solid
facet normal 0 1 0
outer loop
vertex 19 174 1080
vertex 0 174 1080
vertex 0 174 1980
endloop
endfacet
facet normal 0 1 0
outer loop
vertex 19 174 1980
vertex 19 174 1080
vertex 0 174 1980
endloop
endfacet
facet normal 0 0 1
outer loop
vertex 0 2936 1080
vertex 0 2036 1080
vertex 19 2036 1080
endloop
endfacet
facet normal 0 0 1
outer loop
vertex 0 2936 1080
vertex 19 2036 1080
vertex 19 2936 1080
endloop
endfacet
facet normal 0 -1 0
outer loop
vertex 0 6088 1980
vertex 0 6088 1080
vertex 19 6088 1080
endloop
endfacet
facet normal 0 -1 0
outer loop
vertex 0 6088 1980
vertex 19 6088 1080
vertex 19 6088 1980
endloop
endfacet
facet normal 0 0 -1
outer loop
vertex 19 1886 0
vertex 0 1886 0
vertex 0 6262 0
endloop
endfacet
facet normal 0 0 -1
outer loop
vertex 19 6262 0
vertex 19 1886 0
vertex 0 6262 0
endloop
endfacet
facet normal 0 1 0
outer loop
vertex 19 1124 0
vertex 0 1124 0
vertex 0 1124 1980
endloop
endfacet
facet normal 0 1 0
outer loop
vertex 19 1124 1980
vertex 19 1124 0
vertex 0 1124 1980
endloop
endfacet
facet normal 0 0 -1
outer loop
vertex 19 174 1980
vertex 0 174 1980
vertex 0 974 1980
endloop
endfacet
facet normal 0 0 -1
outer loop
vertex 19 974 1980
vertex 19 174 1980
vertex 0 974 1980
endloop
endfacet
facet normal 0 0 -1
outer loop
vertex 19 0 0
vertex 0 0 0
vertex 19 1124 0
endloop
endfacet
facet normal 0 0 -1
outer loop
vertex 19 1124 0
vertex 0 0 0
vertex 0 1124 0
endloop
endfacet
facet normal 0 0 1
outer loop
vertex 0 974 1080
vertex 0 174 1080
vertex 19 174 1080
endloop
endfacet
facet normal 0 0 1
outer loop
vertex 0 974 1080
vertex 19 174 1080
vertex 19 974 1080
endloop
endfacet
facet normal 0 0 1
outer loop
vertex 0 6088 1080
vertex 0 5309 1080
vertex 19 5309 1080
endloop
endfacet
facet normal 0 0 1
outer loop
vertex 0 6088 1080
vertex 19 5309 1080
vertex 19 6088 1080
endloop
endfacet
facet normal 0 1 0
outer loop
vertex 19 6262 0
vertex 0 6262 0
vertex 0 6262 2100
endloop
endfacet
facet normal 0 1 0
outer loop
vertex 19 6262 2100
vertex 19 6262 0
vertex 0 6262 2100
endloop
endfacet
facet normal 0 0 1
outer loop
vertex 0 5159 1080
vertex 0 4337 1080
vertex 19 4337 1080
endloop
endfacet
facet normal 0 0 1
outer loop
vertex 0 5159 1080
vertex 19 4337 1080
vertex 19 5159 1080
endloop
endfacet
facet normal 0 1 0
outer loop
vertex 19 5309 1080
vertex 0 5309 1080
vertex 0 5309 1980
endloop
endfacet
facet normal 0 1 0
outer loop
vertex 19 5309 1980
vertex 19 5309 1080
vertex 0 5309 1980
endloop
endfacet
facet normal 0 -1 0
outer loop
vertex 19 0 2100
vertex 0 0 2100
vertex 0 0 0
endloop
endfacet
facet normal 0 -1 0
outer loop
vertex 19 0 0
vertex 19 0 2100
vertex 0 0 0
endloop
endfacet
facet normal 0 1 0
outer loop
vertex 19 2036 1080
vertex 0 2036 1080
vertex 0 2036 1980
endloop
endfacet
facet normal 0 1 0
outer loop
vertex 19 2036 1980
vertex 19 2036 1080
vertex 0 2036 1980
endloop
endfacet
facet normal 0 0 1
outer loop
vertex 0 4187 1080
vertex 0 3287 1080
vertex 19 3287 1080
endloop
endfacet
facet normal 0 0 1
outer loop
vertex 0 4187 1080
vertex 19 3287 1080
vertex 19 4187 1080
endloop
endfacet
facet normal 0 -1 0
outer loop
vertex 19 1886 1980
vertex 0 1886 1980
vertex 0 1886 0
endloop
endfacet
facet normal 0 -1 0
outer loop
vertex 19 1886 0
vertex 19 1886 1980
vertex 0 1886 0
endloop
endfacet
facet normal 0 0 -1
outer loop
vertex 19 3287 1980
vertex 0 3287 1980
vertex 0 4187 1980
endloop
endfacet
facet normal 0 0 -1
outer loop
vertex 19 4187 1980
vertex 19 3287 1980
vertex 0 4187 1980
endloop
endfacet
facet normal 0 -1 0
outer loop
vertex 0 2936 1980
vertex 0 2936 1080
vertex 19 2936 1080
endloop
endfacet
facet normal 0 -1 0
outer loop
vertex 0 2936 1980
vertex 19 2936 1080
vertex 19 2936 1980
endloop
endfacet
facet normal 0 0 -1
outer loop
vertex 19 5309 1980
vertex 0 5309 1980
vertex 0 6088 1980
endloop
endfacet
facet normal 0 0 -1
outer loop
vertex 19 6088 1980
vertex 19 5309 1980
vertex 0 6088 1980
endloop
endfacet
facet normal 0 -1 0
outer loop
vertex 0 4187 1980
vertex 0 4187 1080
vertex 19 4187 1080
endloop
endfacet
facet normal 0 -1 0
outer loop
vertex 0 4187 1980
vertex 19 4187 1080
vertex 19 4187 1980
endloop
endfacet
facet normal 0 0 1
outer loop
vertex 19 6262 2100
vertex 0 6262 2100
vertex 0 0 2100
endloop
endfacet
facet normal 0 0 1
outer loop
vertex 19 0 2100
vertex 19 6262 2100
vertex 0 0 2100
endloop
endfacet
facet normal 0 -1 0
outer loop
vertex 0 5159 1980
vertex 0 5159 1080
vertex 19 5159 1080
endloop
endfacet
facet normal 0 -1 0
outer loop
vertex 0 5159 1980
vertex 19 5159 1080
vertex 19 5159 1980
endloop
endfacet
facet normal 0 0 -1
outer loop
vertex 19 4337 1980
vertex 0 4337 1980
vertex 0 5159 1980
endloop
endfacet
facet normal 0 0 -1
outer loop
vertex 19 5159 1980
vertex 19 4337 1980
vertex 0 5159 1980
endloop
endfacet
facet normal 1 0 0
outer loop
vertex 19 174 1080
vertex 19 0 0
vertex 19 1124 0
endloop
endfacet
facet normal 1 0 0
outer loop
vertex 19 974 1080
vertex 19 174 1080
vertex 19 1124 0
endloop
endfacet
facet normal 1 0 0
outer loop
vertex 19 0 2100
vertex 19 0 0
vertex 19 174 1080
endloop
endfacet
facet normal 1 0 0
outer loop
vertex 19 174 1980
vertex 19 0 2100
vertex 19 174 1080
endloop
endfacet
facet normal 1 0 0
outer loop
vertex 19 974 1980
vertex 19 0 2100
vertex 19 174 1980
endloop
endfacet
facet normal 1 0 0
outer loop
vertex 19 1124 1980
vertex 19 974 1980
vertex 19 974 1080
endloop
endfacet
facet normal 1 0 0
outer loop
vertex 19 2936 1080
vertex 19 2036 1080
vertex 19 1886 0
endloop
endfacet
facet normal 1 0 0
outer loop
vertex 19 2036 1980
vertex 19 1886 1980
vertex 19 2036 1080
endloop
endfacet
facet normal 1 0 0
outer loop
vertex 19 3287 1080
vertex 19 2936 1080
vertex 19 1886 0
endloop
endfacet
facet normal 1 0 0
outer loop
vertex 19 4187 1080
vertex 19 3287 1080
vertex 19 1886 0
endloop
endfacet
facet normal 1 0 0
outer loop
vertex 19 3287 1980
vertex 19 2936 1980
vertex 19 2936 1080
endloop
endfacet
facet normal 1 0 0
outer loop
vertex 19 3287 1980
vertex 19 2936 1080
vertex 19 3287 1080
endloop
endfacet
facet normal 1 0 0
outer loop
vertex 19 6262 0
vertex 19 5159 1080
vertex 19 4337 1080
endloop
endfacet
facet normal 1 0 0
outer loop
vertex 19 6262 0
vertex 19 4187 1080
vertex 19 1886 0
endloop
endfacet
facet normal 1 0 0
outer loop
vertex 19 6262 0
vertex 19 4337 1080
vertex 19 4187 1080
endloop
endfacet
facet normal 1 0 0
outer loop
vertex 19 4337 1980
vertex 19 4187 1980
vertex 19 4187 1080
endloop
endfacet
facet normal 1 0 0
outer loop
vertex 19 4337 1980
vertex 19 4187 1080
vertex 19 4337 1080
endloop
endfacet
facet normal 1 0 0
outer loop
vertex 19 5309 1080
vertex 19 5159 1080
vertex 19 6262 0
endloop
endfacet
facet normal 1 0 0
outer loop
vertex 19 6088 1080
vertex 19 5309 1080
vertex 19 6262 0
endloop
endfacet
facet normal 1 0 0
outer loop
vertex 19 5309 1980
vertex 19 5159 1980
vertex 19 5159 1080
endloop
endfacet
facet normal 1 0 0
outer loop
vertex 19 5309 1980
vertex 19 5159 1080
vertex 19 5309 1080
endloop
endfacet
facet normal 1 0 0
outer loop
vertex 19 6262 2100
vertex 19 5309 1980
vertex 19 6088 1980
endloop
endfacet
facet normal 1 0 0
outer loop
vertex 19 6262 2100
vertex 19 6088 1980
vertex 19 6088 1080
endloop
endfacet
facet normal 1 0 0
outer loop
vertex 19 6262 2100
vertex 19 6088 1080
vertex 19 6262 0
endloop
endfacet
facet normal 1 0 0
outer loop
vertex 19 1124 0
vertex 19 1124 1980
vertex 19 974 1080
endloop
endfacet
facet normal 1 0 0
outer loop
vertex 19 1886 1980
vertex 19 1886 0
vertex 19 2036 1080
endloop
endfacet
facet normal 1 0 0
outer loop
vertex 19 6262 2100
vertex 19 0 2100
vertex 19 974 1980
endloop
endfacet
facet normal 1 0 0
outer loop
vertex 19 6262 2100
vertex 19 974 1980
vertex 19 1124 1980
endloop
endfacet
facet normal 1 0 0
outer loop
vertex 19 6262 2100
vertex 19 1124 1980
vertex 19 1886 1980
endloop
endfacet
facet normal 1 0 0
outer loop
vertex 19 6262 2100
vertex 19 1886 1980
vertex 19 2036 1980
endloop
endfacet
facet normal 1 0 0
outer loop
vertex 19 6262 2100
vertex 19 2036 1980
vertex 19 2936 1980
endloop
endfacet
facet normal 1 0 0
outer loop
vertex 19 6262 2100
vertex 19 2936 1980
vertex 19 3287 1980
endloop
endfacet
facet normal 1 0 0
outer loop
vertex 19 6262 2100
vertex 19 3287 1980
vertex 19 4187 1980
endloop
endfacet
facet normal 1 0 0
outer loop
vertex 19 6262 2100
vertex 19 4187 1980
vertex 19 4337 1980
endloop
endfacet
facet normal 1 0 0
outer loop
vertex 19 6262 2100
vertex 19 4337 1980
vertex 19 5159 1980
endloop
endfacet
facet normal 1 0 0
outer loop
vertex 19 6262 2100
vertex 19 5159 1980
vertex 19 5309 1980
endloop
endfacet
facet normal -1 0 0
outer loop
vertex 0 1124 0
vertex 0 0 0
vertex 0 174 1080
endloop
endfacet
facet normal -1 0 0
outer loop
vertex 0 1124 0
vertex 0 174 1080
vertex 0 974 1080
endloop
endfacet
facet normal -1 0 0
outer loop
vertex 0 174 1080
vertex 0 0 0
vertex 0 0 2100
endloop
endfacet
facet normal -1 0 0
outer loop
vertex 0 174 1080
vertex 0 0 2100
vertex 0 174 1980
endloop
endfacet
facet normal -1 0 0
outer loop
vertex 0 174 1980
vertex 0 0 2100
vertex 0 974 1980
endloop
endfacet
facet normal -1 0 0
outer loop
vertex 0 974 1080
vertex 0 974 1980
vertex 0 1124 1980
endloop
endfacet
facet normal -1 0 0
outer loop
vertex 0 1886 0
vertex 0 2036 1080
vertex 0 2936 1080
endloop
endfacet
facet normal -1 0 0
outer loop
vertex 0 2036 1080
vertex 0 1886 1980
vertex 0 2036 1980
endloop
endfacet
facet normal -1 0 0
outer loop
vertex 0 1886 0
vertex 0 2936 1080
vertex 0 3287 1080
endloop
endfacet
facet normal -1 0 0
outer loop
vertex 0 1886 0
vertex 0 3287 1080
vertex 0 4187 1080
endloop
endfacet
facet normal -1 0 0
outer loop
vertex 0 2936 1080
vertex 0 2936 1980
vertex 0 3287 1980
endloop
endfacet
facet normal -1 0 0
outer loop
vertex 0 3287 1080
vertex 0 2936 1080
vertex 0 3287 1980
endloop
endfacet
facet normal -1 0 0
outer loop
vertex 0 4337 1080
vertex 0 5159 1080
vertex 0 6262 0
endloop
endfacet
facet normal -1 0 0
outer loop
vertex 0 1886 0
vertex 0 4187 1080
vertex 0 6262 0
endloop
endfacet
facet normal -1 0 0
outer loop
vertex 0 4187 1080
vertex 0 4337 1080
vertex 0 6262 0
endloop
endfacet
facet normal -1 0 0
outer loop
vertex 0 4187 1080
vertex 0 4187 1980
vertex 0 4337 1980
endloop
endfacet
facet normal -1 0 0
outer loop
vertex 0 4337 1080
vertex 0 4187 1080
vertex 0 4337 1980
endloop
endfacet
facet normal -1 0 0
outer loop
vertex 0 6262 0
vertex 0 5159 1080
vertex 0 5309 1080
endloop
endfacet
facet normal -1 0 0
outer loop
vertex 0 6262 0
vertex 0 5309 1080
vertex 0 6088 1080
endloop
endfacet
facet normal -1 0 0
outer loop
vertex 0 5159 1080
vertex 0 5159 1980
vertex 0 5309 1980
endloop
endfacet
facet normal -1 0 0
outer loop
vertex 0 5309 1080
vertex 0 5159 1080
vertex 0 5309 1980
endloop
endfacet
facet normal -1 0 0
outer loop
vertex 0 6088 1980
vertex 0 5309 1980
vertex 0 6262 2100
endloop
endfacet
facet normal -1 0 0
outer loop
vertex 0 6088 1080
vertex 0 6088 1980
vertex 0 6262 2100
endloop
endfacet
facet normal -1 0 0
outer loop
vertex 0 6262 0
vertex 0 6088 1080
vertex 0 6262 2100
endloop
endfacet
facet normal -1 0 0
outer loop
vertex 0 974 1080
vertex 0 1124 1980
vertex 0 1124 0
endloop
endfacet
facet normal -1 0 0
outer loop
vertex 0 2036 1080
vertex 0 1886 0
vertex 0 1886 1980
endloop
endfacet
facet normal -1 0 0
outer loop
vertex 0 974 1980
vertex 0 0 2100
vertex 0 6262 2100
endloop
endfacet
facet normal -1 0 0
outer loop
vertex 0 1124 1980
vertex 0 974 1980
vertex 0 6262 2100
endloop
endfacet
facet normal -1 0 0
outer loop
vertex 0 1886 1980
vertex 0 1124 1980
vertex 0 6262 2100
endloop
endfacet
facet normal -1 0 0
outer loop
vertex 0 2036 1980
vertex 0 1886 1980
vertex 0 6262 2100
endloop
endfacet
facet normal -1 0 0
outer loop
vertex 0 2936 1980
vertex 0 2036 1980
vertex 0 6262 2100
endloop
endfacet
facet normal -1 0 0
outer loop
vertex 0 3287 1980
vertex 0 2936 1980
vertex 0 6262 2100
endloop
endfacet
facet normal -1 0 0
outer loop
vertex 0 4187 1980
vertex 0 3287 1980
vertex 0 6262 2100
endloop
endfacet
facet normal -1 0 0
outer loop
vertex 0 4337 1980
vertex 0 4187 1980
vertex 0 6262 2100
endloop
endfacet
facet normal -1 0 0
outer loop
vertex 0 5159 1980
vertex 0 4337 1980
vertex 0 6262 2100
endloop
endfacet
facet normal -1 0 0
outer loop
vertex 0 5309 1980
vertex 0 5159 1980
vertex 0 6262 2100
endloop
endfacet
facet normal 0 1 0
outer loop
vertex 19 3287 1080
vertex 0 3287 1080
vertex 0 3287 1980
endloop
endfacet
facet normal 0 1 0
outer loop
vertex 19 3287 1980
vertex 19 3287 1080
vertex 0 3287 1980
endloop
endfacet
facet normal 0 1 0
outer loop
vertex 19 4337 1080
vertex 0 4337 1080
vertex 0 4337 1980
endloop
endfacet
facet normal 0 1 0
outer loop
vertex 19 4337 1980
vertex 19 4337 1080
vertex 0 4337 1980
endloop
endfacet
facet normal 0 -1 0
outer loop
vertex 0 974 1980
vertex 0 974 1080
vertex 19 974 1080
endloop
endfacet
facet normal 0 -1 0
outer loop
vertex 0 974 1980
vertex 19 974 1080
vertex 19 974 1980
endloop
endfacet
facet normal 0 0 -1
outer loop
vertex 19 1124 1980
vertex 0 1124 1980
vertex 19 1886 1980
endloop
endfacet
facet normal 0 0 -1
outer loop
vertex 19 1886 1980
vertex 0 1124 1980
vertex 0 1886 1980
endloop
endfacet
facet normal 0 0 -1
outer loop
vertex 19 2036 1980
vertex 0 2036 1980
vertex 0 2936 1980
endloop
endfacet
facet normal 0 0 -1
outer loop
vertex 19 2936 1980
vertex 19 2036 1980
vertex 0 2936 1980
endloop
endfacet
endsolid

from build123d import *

# Parameters (mm, degrees)
F0_W     = 800
F0_H     = 900
F0_W_2   = 900
F0_W_3   = 822
F0_W_4   = 779
F1_DEPTH = 19


with BuildPart() as f1:
    # F0 (on Right) → F1 (new body)
    with BuildSketch(Plane.YZ):
        Polygon((0, 2100), (0, 0), (1124, 0), (1124, 1980), (1886, 1980), (1886, 0), (6262, 0), (6262, 2100), align=None)
        with Locations((574, 1530)):
            Rectangle(F0_W, F0_H, mode=Mode.SUBTRACT)
        with Locations((2486, 1530)):
            Rectangle(F0_W_2, F0_H, mode=Mode.SUBTRACT)
        with Locations((3737, 1530)):
            Rectangle(F0_W_2, F0_H, mode=Mode.SUBTRACT)
        with Locations((4748, 1530)):
            Rectangle(F0_W_3, F0_H, mode=Mode.SUBTRACT)
        with Locations((5698.5, 1530)):
            Rectangle(F0_W_4, F0_H, mode=Mode.SUBTRACT)
    extrude(amount=F1_DEPTH)


solid = f1.part
